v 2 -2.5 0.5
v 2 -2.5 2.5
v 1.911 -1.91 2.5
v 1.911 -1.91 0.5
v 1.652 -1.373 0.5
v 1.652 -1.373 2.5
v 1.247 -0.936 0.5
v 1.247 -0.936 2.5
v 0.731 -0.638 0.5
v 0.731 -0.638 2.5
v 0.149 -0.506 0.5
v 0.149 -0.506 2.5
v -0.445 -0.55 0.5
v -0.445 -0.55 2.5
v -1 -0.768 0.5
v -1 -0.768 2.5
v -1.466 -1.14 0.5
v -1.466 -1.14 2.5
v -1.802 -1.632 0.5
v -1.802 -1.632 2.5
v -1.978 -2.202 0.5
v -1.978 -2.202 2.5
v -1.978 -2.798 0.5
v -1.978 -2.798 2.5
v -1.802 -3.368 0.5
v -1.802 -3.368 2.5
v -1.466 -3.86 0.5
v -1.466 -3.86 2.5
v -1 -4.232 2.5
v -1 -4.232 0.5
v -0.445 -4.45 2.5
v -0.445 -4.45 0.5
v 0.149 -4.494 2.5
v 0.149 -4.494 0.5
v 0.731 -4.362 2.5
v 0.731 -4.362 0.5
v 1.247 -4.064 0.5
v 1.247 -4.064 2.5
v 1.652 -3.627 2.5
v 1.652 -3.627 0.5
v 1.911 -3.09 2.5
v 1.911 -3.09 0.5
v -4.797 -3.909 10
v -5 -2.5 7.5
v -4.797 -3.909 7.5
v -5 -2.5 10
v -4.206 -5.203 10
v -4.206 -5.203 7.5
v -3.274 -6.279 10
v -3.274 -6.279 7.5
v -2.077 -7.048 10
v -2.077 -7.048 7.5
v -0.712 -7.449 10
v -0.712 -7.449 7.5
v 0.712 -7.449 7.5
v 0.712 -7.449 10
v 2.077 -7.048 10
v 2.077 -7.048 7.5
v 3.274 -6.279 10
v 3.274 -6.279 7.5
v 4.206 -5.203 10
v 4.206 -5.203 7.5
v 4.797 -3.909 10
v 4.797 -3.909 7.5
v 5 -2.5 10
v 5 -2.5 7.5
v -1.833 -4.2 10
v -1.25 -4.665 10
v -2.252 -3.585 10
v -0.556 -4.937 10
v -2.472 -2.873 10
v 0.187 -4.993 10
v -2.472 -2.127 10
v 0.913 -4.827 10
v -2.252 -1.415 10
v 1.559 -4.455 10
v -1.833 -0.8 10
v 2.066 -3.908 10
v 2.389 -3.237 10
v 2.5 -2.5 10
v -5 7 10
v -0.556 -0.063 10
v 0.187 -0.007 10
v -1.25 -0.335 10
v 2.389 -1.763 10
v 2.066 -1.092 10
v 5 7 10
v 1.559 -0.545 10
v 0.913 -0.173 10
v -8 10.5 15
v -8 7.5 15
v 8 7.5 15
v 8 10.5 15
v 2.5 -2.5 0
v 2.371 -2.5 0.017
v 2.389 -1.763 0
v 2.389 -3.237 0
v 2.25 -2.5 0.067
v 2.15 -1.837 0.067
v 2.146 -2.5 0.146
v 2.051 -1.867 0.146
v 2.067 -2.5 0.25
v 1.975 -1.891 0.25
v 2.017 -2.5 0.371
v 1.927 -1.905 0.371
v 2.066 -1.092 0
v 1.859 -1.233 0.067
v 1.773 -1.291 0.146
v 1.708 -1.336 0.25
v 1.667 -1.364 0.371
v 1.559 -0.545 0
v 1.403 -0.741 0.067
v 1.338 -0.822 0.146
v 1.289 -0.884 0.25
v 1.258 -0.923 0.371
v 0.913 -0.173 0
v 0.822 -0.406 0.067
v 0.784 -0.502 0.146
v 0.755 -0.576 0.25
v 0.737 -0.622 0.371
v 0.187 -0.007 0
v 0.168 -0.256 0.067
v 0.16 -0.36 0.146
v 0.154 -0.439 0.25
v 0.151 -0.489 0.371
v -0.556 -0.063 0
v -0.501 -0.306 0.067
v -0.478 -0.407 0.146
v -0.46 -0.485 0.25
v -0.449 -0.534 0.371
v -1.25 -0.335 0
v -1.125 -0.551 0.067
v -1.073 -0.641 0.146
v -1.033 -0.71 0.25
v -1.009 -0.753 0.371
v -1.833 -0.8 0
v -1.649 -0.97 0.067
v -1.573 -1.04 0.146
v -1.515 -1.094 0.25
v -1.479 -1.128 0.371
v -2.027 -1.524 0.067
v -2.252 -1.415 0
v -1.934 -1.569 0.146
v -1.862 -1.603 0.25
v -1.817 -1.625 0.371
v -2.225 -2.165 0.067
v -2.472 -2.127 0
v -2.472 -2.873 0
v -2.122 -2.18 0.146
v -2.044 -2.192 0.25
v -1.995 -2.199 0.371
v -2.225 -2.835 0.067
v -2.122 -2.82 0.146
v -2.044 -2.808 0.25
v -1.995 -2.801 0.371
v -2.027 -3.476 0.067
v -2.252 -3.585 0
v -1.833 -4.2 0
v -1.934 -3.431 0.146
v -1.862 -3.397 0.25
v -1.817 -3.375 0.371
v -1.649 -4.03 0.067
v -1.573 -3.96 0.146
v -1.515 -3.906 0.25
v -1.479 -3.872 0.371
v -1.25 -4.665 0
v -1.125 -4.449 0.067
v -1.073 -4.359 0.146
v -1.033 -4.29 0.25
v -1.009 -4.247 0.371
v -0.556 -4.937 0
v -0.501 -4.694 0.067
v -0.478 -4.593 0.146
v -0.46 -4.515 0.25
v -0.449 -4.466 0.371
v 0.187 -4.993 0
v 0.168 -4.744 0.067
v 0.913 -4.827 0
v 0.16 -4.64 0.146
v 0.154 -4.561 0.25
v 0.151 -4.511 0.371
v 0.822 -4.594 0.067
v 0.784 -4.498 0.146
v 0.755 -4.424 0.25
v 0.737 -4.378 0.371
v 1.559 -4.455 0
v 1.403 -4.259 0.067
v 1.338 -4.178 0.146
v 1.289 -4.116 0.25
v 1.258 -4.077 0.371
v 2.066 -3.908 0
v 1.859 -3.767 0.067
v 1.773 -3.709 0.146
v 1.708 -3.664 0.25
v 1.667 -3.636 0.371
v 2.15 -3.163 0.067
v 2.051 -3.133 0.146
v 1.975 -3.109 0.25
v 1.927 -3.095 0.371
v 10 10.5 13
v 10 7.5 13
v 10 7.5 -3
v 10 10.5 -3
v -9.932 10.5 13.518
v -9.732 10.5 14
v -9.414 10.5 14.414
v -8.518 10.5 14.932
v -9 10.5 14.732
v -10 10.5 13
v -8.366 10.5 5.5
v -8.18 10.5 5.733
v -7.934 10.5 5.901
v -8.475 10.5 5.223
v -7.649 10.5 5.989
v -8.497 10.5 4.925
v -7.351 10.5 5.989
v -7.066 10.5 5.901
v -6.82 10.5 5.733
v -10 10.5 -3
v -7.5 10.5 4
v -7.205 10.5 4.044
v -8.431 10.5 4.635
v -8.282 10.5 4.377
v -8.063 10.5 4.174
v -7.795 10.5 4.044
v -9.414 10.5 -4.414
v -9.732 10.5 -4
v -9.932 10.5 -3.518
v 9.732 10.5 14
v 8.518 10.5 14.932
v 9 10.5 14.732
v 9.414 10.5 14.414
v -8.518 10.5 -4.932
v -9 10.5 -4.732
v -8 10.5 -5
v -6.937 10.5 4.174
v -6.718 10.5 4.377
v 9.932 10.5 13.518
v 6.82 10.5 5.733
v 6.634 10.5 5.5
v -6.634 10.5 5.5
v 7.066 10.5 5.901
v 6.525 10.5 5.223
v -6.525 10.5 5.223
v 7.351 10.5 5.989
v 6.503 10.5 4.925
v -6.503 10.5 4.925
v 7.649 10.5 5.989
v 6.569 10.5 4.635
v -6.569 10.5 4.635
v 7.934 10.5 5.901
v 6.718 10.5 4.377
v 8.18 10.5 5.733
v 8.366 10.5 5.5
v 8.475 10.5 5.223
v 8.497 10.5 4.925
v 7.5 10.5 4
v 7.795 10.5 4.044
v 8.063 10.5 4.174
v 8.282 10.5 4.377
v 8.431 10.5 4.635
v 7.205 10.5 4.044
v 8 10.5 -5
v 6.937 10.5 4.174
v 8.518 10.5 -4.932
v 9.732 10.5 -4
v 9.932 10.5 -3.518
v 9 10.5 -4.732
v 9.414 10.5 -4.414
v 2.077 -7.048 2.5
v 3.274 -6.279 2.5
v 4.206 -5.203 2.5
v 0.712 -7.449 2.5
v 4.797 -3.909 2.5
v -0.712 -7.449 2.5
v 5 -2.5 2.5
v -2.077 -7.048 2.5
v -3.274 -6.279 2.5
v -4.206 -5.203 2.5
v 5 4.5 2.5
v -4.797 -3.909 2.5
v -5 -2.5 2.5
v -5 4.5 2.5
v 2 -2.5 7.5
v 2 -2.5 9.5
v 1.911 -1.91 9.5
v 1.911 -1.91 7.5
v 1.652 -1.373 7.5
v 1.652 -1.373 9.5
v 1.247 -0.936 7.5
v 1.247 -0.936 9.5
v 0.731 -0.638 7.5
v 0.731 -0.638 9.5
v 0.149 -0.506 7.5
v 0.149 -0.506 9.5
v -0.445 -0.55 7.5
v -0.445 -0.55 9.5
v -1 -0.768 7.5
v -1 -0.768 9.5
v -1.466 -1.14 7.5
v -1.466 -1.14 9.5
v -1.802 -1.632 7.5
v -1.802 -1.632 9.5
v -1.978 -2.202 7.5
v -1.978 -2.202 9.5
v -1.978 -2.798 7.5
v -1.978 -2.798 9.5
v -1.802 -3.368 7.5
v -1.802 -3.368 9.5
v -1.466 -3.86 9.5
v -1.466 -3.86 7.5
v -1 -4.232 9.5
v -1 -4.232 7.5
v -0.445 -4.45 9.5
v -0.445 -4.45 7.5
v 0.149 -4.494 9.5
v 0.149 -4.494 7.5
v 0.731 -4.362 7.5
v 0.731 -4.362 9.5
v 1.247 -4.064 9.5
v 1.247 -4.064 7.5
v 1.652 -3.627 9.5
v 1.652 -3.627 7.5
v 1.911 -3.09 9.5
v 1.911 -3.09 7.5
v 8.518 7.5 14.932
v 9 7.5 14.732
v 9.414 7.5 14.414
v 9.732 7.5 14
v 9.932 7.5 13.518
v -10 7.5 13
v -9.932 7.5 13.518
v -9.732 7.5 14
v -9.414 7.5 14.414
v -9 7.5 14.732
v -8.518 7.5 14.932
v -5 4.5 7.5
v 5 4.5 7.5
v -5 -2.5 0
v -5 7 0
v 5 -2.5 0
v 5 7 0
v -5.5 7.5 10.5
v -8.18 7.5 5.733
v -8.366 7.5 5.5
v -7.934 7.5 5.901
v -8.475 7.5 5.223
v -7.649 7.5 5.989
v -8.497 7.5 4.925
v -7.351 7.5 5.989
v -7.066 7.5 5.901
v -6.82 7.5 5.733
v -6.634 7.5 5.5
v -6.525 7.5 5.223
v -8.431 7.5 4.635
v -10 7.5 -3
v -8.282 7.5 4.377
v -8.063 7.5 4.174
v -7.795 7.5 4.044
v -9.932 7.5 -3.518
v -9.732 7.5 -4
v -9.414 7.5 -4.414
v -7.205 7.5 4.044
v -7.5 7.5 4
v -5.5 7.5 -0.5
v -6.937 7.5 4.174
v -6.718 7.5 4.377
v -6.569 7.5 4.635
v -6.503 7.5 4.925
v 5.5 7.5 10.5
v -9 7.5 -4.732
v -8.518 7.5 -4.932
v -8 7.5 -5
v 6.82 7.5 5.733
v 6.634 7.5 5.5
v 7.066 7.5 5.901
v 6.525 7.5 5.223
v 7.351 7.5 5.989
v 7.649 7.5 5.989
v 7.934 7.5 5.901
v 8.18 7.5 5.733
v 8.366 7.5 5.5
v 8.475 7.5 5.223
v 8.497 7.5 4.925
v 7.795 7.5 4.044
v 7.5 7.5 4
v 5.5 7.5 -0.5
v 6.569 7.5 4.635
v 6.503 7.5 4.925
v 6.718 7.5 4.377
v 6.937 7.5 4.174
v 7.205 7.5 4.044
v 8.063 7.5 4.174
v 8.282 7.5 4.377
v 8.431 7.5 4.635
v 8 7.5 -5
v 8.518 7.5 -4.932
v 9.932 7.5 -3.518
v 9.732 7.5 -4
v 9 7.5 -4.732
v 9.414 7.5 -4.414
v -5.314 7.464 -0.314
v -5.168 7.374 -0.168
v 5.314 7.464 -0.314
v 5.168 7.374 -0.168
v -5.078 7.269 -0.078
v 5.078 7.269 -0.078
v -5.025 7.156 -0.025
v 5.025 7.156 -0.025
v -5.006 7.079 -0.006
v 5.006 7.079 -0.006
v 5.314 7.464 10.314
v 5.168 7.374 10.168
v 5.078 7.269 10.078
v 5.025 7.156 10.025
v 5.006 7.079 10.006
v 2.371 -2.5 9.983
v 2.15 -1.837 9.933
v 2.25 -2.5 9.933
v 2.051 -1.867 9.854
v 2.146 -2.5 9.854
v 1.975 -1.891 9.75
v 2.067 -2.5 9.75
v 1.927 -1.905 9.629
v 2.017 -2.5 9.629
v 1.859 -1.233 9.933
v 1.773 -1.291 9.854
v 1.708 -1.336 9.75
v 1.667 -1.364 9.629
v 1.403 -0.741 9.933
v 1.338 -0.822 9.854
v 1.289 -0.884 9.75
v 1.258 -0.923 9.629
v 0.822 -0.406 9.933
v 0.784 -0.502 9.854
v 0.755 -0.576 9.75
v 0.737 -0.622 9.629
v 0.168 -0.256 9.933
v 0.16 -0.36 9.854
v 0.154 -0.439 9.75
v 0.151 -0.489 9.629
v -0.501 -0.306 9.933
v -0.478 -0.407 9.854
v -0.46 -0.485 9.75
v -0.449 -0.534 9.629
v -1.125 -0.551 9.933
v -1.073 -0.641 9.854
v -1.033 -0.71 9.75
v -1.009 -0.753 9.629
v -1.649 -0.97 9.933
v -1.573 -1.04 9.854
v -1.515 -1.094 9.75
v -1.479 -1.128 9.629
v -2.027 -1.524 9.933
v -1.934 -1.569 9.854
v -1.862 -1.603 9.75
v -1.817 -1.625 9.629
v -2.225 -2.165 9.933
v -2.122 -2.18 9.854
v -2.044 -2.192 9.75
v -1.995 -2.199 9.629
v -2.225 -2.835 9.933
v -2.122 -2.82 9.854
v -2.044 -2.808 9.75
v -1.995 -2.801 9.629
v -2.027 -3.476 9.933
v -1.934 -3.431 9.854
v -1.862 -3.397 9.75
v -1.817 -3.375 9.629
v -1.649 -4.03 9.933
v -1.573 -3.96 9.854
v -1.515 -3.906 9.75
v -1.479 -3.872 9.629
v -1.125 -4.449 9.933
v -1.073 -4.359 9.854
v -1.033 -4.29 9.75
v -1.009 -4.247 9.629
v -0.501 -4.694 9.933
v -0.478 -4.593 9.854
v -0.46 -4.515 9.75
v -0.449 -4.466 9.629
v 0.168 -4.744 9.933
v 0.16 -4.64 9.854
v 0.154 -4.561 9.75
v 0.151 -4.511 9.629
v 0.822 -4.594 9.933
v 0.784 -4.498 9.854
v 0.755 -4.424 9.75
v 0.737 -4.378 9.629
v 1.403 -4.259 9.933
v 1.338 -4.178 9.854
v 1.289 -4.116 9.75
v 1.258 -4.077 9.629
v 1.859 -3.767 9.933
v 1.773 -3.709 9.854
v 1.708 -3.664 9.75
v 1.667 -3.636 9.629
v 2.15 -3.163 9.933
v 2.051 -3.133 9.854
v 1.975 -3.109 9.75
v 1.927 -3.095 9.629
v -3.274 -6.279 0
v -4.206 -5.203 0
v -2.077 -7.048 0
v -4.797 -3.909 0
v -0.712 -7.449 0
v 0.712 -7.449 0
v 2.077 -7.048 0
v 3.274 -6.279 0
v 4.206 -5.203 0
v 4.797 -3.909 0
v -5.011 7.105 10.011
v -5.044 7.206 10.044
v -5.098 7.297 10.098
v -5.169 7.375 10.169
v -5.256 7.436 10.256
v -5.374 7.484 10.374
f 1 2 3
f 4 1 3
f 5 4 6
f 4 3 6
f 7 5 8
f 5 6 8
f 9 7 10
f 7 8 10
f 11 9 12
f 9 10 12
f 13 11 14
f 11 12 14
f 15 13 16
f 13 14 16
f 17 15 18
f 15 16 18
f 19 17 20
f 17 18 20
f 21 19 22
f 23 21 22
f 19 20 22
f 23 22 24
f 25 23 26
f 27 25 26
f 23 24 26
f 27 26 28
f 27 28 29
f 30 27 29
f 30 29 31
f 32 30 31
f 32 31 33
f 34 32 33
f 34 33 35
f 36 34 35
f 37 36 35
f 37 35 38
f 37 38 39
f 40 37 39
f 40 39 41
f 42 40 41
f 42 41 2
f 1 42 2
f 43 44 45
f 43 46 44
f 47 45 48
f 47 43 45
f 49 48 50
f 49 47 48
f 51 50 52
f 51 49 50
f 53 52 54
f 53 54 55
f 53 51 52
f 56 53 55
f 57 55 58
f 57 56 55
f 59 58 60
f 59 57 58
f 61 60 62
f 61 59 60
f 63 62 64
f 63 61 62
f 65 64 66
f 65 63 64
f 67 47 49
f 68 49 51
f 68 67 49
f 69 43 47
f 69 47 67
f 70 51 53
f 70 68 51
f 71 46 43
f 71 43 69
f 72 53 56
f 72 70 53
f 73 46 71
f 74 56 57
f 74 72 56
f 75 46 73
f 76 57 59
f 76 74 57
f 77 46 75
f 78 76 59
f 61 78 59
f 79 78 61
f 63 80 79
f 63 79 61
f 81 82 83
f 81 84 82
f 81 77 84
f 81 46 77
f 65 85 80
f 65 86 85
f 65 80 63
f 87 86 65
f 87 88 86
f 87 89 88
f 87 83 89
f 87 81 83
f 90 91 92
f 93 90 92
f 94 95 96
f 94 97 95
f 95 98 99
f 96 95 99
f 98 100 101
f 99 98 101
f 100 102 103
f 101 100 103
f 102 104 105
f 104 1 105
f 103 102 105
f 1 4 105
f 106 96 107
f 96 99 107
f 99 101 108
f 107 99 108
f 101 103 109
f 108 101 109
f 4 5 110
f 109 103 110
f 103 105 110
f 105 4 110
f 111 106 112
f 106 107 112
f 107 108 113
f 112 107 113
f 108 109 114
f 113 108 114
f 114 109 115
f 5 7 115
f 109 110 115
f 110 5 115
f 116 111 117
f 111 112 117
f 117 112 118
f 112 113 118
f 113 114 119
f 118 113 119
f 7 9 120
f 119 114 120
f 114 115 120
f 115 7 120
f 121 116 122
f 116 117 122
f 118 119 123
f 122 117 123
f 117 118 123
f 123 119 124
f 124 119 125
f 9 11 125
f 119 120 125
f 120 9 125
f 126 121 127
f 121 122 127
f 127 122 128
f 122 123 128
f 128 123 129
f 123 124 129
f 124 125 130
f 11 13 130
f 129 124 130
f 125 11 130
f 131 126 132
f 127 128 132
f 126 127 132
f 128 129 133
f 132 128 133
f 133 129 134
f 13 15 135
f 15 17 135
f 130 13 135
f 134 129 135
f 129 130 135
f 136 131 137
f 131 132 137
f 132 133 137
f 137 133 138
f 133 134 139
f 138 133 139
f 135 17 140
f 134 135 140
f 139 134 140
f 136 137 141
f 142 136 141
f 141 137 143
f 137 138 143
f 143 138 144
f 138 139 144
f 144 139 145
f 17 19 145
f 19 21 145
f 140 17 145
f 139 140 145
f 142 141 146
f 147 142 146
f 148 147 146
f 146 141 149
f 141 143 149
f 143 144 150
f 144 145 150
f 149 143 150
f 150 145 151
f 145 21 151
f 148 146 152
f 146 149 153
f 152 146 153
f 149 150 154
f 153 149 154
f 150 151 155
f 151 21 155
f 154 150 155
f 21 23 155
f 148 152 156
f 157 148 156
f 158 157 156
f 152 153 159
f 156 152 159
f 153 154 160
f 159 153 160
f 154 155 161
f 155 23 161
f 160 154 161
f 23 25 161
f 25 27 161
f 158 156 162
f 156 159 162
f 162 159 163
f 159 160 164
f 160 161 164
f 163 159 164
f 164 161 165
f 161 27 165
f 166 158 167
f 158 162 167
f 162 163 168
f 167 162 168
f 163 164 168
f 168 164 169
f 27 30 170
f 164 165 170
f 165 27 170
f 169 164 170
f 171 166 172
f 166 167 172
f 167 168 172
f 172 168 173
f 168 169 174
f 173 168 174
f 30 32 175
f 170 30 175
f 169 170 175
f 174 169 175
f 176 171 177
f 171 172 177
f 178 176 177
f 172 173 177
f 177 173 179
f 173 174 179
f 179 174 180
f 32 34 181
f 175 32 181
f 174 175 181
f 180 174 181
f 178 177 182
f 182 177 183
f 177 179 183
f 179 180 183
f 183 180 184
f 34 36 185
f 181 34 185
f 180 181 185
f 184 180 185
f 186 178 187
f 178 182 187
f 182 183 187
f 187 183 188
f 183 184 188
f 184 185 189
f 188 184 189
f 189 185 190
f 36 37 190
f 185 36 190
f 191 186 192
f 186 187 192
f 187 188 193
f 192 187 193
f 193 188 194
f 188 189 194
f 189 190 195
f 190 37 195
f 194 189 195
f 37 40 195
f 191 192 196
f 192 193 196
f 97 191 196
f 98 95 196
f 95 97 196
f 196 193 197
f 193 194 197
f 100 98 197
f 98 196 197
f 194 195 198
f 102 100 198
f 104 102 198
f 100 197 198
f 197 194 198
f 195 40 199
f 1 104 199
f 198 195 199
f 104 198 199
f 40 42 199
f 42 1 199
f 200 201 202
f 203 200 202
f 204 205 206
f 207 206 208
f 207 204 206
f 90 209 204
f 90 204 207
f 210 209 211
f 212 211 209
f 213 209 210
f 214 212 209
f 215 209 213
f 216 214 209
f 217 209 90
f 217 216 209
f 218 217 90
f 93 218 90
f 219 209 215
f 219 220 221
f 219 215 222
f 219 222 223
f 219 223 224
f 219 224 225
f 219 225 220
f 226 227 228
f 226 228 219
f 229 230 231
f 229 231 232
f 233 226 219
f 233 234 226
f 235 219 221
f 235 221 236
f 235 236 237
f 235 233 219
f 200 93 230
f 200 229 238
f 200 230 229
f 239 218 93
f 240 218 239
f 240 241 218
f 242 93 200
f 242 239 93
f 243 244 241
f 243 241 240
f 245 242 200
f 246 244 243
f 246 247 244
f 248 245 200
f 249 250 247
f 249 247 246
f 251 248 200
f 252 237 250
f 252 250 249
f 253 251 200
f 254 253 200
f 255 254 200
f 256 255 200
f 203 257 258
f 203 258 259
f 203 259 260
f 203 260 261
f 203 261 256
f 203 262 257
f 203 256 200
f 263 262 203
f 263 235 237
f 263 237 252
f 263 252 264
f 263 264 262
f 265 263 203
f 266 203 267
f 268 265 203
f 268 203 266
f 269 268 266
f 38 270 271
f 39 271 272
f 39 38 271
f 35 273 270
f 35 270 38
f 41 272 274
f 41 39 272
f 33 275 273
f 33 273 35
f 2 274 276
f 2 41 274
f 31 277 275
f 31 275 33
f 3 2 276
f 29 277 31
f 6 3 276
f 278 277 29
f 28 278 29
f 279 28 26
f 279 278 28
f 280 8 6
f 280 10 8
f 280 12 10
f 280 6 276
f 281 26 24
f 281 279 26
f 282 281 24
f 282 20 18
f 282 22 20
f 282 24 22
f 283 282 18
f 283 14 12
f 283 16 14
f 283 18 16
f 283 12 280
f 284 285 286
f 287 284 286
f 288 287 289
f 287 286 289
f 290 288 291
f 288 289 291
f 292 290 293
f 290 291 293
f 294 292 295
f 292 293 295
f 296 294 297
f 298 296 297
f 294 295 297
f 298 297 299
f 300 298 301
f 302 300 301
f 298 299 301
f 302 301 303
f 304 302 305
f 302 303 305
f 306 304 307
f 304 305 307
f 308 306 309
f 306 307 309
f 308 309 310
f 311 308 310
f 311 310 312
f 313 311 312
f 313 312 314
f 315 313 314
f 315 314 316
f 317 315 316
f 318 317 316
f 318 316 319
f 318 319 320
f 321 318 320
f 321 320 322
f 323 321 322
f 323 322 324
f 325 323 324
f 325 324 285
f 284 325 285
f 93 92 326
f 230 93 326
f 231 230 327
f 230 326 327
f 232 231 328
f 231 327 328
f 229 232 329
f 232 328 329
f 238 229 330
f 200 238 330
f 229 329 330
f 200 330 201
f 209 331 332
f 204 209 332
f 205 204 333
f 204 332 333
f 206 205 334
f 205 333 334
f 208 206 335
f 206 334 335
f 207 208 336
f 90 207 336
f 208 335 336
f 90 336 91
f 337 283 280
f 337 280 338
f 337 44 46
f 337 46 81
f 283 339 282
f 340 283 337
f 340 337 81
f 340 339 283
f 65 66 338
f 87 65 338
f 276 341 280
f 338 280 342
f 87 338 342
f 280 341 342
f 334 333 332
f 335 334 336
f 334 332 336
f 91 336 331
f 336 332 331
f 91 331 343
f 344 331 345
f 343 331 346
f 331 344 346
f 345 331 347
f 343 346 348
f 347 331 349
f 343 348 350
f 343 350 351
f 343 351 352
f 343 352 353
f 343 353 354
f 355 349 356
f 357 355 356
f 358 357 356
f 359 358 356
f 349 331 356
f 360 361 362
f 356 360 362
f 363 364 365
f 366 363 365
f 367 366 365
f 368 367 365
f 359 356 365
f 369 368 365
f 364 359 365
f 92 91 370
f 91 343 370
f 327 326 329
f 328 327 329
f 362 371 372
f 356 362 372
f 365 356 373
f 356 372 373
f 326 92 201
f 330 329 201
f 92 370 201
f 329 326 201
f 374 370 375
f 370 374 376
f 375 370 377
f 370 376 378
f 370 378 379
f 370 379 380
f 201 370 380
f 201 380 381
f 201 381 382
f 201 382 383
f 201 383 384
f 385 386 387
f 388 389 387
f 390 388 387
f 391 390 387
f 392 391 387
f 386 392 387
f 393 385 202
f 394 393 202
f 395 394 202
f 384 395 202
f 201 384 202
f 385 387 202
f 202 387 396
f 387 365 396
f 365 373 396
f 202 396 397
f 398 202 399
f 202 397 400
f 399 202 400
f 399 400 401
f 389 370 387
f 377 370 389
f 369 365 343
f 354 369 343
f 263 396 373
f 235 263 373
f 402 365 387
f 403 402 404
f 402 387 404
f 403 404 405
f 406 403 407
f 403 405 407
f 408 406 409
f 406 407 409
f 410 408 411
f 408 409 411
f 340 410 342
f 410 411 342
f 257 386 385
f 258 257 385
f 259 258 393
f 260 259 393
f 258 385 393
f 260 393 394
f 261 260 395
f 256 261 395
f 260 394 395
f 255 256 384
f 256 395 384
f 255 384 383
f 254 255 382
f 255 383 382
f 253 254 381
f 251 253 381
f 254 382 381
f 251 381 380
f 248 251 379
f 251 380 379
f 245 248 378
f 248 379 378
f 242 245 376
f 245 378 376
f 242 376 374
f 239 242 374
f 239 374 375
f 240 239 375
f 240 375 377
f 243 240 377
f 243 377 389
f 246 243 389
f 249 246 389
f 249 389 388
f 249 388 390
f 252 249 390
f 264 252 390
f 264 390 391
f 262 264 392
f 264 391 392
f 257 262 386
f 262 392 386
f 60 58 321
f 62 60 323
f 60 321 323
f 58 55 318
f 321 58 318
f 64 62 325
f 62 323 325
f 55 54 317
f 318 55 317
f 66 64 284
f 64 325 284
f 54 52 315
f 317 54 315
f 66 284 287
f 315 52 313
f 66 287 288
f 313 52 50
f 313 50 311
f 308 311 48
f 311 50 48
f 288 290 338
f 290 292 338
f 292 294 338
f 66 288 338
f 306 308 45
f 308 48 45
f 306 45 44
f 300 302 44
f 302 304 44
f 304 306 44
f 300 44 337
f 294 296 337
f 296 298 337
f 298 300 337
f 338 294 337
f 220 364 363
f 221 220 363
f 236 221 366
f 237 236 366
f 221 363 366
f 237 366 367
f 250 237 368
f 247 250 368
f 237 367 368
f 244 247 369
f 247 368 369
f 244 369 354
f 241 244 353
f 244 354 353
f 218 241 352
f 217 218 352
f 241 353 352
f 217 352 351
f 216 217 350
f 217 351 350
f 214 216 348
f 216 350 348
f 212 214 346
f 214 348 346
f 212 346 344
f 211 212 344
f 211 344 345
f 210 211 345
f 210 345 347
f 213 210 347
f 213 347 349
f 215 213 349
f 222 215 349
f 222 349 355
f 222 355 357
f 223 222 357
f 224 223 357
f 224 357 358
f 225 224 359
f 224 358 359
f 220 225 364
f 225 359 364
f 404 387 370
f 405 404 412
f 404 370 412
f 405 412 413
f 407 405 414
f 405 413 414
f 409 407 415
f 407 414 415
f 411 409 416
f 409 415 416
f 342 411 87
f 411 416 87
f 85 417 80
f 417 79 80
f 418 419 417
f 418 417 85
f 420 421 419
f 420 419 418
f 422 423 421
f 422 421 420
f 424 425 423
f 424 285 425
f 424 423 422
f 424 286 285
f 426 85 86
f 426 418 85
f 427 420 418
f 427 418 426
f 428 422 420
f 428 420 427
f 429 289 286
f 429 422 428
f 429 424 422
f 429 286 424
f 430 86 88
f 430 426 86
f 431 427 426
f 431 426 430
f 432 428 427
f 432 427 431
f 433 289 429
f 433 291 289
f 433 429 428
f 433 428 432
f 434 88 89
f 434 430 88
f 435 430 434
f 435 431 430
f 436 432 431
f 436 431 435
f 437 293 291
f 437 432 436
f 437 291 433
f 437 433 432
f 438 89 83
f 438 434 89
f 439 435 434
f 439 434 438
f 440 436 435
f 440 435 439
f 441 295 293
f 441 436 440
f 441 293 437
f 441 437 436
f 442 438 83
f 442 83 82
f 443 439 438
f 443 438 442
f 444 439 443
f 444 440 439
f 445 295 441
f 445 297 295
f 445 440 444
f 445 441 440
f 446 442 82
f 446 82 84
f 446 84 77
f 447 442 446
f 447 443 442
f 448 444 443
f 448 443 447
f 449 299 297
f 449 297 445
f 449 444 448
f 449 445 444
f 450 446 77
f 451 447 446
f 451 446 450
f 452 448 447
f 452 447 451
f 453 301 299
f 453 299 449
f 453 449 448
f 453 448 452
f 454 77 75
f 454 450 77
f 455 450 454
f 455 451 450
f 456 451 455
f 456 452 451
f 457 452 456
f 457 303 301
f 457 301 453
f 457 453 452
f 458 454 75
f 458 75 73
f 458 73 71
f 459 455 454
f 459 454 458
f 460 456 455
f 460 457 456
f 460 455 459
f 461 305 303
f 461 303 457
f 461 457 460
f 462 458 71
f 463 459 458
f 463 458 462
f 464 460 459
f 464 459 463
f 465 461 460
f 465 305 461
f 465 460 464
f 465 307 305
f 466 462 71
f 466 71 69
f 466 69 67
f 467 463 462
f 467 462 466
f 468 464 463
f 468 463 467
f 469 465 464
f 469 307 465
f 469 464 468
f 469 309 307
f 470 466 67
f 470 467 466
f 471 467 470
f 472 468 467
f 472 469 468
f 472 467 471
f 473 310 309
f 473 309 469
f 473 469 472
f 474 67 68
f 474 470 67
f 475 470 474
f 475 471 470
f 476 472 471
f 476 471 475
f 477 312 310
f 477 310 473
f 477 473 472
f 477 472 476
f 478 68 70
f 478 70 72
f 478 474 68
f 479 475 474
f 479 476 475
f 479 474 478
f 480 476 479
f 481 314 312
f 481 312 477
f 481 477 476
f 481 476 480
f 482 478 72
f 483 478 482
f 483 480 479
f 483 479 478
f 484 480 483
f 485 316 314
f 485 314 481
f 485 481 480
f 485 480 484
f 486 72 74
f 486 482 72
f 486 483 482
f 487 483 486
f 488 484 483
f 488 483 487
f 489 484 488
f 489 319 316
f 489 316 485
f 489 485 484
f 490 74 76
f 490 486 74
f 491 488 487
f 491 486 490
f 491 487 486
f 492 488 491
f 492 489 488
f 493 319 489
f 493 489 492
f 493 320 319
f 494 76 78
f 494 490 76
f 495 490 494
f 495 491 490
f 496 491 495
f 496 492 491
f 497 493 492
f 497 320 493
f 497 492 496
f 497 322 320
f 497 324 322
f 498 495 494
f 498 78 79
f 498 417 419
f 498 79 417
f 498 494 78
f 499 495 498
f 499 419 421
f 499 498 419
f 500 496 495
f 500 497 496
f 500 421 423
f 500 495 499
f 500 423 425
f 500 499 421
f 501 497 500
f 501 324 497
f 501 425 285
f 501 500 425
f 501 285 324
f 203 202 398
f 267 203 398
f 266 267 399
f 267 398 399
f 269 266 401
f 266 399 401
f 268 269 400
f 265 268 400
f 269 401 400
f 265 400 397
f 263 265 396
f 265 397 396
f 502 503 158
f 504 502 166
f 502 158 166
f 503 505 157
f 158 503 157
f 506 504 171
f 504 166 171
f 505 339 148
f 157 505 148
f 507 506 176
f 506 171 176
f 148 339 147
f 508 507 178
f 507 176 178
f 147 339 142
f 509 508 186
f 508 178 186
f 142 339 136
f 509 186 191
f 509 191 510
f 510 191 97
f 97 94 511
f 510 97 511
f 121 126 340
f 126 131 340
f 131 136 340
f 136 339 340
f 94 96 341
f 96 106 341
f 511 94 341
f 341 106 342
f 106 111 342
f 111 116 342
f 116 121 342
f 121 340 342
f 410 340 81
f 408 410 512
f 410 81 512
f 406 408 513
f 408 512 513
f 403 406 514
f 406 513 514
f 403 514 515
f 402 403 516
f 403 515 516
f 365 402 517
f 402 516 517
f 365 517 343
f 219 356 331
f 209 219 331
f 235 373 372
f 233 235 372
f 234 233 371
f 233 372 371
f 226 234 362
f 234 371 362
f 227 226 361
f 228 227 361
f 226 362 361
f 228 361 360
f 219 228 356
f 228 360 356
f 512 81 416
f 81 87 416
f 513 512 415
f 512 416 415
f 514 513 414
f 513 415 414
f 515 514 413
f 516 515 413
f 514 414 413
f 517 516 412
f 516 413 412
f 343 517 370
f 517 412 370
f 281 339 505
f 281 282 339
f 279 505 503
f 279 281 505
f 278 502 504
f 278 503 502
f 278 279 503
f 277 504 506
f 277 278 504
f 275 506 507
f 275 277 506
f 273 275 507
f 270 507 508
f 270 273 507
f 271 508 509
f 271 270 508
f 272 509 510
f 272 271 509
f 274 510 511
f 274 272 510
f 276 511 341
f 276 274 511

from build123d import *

# Parameters (mm, degrees)
ESQUISSE1_W             = 10
ESQUISSE1_H             = 15
BOSS_EXTRU_1_DEPTH      = 10
CONG_1_RADIUS           = 5
CONG_1_LENGTH           = 10
ESQUISSE3_W             = 5
ESQUISSE3_H             = 12
ENL_V_MAT_EXTRU_1_DEPTH = 10
ESQUISSE4_W             = 10
ESQUISSE4_H             = 10
BOSS_EXTRU_2_DEPTH      = 3
ESQUISSE5_R             = 1
ENL_V_MAT_EXTRU_2_DEPTH = 3
ESQUISSE6_R             = 2
ENL_V_MAT_EXTRU_3_DEPTH = 21.862646045
CONG_2_R                = 0.5
CONG_3_R                = 0.5


with BuildPart() as part:
    # Esquisse1 → Boss.-Extru.1 (new body)
    with BuildSketch(Plane.XY):
        Rectangle(ESQUISSE1_W, ESQUISSE1_H)
    extrude(amount=BOSS_EXTRU_1_DEPTH)

    # Congé1: full round fillet: the end face becomes a half cylinder, R = half its width
    cong_1_face = Plane((0, -7.5, 5), x_dir=(0, 0, 1), z_dir=(0, -1, 0))  # on the end face: x along it, z out of the body
    cong_1_slab = cong_1_face.offset(-CONG_1_RADIUS / 2) * Box(CONG_1_LENGTH, 2 * CONG_1_RADIUS, CONG_1_RADIUS, mode=Mode.PRIVATE)  # the body's end, R deep
    cong_1_round = Plane((0, -2.5, 5), x_dir=(0, -1, 0), z_dir=(0, 0, 1)) * Cylinder(CONG_1_RADIUS, CONG_1_LENGTH, mode=Mode.PRIVATE)  # its axis R under the face
    add(cong_1_slab - cong_1_round, mode=Mode.SUBTRACT)

    # Esquisse3 → Enlèv. mat.-Extru.1 (cut)
    with BuildSketch(Plane.ZY.offset(5)):
        with Locations((5, -1.5)):
            Rectangle(ESQUISSE3_W, ESQUISSE3_H)
    extrude(amount=-ENL_V_MAT_EXTRU_1_DEPTH, mode=Mode.SUBTRACT)

    # Esquisse4 → Boss.-Extru.2 (add)
    # profile 1 of 2: a face of its own
    with BuildSketch(Plane(origin=(0, 7.5, 0), x_dir=(1, 0, 0), z_dir=(0, 1, 0))):
        with BuildLine():
            Line((8, 5), (-8, 5))
            ThreePointArc((-8, 5), (-9.414213562, 4.414213562), (-10, 3))
            Line((-10, 3), (-10, -13))
            ThreePointArc((-10, -13), (-9.414213562, -14.414213562), (-8, -15))
            Line((-8, -15), (8, -15))
            ThreePointArc((8, -15), (9.414213562, -14.414213562), (10, -13))
            Line((10, -13), (10, 3))
            ThreePointArc((10, 3), (9.414213562, 4.414213562), (8, 5))
        make_face()
        with Locations((0, -5)):
            Rectangle(ESQUISSE4_W, ESQUISSE4_H, mode=Mode.SUBTRACT)
    # profile 2 of 2: a face of its own
    with BuildSketch(Plane(origin=(0, 7.5, 0), x_dir=(1, 0, 0), z_dir=(0, 1, 0))):
        with Locations((0, -5)):
            Rectangle(ESQUISSE4_W, ESQUISSE4_H)
    extrude(amount=BOSS_EXTRU_2_DEPTH)

    # Esquisse5 → Enlèv. mat.-Extru.2 (cut)
    with BuildSketch(Plane.XZ.offset(-7.5)):
        with Locations(Location((-7.5, 5, 0), (0, 0, 270))):
            Circle(ESQUISSE5_R)
        with Locations(Location((7.5, 5, 0), (0, 0, 270))):
            Circle(ESQUISSE5_R)
    extrude(amount=-ENL_V_MAT_EXTRU_2_DEPTH, mode=Mode.SUBTRACT)

    # Esquisse6 → Enlèv. mat.-Extru.3 (cut, through all)
    with BuildSketch(Plane.XY.offset(10)):
        with Locations((0, -2.5)):
            Circle(ESQUISSE6_R)
    extrude(amount=-ENL_V_MAT_EXTRU_3_DEPTH, mode=Mode.SUBTRACT)

    # Congé2
    cong_2_edges = [part.edges().sort_by_distance(p)[0] for p in [
        (-2, -2.5, 0),
        (-2, -2.5, 10),
    ]]
    fillet(cong_2_edges, radius=CONG_2_R)

    # Congé3
    cong_3_edges = [part.edges().sort_by_distance(p)[0] for p in [
        (0, 7.5, 0),
        (-5, 7.5, 5),
        (5, 7.5, 5),
        (0, 7.5, 10),
    ]]
    fillet(cong_3_edges, radius=CONG_3_R)


solid = part.part
